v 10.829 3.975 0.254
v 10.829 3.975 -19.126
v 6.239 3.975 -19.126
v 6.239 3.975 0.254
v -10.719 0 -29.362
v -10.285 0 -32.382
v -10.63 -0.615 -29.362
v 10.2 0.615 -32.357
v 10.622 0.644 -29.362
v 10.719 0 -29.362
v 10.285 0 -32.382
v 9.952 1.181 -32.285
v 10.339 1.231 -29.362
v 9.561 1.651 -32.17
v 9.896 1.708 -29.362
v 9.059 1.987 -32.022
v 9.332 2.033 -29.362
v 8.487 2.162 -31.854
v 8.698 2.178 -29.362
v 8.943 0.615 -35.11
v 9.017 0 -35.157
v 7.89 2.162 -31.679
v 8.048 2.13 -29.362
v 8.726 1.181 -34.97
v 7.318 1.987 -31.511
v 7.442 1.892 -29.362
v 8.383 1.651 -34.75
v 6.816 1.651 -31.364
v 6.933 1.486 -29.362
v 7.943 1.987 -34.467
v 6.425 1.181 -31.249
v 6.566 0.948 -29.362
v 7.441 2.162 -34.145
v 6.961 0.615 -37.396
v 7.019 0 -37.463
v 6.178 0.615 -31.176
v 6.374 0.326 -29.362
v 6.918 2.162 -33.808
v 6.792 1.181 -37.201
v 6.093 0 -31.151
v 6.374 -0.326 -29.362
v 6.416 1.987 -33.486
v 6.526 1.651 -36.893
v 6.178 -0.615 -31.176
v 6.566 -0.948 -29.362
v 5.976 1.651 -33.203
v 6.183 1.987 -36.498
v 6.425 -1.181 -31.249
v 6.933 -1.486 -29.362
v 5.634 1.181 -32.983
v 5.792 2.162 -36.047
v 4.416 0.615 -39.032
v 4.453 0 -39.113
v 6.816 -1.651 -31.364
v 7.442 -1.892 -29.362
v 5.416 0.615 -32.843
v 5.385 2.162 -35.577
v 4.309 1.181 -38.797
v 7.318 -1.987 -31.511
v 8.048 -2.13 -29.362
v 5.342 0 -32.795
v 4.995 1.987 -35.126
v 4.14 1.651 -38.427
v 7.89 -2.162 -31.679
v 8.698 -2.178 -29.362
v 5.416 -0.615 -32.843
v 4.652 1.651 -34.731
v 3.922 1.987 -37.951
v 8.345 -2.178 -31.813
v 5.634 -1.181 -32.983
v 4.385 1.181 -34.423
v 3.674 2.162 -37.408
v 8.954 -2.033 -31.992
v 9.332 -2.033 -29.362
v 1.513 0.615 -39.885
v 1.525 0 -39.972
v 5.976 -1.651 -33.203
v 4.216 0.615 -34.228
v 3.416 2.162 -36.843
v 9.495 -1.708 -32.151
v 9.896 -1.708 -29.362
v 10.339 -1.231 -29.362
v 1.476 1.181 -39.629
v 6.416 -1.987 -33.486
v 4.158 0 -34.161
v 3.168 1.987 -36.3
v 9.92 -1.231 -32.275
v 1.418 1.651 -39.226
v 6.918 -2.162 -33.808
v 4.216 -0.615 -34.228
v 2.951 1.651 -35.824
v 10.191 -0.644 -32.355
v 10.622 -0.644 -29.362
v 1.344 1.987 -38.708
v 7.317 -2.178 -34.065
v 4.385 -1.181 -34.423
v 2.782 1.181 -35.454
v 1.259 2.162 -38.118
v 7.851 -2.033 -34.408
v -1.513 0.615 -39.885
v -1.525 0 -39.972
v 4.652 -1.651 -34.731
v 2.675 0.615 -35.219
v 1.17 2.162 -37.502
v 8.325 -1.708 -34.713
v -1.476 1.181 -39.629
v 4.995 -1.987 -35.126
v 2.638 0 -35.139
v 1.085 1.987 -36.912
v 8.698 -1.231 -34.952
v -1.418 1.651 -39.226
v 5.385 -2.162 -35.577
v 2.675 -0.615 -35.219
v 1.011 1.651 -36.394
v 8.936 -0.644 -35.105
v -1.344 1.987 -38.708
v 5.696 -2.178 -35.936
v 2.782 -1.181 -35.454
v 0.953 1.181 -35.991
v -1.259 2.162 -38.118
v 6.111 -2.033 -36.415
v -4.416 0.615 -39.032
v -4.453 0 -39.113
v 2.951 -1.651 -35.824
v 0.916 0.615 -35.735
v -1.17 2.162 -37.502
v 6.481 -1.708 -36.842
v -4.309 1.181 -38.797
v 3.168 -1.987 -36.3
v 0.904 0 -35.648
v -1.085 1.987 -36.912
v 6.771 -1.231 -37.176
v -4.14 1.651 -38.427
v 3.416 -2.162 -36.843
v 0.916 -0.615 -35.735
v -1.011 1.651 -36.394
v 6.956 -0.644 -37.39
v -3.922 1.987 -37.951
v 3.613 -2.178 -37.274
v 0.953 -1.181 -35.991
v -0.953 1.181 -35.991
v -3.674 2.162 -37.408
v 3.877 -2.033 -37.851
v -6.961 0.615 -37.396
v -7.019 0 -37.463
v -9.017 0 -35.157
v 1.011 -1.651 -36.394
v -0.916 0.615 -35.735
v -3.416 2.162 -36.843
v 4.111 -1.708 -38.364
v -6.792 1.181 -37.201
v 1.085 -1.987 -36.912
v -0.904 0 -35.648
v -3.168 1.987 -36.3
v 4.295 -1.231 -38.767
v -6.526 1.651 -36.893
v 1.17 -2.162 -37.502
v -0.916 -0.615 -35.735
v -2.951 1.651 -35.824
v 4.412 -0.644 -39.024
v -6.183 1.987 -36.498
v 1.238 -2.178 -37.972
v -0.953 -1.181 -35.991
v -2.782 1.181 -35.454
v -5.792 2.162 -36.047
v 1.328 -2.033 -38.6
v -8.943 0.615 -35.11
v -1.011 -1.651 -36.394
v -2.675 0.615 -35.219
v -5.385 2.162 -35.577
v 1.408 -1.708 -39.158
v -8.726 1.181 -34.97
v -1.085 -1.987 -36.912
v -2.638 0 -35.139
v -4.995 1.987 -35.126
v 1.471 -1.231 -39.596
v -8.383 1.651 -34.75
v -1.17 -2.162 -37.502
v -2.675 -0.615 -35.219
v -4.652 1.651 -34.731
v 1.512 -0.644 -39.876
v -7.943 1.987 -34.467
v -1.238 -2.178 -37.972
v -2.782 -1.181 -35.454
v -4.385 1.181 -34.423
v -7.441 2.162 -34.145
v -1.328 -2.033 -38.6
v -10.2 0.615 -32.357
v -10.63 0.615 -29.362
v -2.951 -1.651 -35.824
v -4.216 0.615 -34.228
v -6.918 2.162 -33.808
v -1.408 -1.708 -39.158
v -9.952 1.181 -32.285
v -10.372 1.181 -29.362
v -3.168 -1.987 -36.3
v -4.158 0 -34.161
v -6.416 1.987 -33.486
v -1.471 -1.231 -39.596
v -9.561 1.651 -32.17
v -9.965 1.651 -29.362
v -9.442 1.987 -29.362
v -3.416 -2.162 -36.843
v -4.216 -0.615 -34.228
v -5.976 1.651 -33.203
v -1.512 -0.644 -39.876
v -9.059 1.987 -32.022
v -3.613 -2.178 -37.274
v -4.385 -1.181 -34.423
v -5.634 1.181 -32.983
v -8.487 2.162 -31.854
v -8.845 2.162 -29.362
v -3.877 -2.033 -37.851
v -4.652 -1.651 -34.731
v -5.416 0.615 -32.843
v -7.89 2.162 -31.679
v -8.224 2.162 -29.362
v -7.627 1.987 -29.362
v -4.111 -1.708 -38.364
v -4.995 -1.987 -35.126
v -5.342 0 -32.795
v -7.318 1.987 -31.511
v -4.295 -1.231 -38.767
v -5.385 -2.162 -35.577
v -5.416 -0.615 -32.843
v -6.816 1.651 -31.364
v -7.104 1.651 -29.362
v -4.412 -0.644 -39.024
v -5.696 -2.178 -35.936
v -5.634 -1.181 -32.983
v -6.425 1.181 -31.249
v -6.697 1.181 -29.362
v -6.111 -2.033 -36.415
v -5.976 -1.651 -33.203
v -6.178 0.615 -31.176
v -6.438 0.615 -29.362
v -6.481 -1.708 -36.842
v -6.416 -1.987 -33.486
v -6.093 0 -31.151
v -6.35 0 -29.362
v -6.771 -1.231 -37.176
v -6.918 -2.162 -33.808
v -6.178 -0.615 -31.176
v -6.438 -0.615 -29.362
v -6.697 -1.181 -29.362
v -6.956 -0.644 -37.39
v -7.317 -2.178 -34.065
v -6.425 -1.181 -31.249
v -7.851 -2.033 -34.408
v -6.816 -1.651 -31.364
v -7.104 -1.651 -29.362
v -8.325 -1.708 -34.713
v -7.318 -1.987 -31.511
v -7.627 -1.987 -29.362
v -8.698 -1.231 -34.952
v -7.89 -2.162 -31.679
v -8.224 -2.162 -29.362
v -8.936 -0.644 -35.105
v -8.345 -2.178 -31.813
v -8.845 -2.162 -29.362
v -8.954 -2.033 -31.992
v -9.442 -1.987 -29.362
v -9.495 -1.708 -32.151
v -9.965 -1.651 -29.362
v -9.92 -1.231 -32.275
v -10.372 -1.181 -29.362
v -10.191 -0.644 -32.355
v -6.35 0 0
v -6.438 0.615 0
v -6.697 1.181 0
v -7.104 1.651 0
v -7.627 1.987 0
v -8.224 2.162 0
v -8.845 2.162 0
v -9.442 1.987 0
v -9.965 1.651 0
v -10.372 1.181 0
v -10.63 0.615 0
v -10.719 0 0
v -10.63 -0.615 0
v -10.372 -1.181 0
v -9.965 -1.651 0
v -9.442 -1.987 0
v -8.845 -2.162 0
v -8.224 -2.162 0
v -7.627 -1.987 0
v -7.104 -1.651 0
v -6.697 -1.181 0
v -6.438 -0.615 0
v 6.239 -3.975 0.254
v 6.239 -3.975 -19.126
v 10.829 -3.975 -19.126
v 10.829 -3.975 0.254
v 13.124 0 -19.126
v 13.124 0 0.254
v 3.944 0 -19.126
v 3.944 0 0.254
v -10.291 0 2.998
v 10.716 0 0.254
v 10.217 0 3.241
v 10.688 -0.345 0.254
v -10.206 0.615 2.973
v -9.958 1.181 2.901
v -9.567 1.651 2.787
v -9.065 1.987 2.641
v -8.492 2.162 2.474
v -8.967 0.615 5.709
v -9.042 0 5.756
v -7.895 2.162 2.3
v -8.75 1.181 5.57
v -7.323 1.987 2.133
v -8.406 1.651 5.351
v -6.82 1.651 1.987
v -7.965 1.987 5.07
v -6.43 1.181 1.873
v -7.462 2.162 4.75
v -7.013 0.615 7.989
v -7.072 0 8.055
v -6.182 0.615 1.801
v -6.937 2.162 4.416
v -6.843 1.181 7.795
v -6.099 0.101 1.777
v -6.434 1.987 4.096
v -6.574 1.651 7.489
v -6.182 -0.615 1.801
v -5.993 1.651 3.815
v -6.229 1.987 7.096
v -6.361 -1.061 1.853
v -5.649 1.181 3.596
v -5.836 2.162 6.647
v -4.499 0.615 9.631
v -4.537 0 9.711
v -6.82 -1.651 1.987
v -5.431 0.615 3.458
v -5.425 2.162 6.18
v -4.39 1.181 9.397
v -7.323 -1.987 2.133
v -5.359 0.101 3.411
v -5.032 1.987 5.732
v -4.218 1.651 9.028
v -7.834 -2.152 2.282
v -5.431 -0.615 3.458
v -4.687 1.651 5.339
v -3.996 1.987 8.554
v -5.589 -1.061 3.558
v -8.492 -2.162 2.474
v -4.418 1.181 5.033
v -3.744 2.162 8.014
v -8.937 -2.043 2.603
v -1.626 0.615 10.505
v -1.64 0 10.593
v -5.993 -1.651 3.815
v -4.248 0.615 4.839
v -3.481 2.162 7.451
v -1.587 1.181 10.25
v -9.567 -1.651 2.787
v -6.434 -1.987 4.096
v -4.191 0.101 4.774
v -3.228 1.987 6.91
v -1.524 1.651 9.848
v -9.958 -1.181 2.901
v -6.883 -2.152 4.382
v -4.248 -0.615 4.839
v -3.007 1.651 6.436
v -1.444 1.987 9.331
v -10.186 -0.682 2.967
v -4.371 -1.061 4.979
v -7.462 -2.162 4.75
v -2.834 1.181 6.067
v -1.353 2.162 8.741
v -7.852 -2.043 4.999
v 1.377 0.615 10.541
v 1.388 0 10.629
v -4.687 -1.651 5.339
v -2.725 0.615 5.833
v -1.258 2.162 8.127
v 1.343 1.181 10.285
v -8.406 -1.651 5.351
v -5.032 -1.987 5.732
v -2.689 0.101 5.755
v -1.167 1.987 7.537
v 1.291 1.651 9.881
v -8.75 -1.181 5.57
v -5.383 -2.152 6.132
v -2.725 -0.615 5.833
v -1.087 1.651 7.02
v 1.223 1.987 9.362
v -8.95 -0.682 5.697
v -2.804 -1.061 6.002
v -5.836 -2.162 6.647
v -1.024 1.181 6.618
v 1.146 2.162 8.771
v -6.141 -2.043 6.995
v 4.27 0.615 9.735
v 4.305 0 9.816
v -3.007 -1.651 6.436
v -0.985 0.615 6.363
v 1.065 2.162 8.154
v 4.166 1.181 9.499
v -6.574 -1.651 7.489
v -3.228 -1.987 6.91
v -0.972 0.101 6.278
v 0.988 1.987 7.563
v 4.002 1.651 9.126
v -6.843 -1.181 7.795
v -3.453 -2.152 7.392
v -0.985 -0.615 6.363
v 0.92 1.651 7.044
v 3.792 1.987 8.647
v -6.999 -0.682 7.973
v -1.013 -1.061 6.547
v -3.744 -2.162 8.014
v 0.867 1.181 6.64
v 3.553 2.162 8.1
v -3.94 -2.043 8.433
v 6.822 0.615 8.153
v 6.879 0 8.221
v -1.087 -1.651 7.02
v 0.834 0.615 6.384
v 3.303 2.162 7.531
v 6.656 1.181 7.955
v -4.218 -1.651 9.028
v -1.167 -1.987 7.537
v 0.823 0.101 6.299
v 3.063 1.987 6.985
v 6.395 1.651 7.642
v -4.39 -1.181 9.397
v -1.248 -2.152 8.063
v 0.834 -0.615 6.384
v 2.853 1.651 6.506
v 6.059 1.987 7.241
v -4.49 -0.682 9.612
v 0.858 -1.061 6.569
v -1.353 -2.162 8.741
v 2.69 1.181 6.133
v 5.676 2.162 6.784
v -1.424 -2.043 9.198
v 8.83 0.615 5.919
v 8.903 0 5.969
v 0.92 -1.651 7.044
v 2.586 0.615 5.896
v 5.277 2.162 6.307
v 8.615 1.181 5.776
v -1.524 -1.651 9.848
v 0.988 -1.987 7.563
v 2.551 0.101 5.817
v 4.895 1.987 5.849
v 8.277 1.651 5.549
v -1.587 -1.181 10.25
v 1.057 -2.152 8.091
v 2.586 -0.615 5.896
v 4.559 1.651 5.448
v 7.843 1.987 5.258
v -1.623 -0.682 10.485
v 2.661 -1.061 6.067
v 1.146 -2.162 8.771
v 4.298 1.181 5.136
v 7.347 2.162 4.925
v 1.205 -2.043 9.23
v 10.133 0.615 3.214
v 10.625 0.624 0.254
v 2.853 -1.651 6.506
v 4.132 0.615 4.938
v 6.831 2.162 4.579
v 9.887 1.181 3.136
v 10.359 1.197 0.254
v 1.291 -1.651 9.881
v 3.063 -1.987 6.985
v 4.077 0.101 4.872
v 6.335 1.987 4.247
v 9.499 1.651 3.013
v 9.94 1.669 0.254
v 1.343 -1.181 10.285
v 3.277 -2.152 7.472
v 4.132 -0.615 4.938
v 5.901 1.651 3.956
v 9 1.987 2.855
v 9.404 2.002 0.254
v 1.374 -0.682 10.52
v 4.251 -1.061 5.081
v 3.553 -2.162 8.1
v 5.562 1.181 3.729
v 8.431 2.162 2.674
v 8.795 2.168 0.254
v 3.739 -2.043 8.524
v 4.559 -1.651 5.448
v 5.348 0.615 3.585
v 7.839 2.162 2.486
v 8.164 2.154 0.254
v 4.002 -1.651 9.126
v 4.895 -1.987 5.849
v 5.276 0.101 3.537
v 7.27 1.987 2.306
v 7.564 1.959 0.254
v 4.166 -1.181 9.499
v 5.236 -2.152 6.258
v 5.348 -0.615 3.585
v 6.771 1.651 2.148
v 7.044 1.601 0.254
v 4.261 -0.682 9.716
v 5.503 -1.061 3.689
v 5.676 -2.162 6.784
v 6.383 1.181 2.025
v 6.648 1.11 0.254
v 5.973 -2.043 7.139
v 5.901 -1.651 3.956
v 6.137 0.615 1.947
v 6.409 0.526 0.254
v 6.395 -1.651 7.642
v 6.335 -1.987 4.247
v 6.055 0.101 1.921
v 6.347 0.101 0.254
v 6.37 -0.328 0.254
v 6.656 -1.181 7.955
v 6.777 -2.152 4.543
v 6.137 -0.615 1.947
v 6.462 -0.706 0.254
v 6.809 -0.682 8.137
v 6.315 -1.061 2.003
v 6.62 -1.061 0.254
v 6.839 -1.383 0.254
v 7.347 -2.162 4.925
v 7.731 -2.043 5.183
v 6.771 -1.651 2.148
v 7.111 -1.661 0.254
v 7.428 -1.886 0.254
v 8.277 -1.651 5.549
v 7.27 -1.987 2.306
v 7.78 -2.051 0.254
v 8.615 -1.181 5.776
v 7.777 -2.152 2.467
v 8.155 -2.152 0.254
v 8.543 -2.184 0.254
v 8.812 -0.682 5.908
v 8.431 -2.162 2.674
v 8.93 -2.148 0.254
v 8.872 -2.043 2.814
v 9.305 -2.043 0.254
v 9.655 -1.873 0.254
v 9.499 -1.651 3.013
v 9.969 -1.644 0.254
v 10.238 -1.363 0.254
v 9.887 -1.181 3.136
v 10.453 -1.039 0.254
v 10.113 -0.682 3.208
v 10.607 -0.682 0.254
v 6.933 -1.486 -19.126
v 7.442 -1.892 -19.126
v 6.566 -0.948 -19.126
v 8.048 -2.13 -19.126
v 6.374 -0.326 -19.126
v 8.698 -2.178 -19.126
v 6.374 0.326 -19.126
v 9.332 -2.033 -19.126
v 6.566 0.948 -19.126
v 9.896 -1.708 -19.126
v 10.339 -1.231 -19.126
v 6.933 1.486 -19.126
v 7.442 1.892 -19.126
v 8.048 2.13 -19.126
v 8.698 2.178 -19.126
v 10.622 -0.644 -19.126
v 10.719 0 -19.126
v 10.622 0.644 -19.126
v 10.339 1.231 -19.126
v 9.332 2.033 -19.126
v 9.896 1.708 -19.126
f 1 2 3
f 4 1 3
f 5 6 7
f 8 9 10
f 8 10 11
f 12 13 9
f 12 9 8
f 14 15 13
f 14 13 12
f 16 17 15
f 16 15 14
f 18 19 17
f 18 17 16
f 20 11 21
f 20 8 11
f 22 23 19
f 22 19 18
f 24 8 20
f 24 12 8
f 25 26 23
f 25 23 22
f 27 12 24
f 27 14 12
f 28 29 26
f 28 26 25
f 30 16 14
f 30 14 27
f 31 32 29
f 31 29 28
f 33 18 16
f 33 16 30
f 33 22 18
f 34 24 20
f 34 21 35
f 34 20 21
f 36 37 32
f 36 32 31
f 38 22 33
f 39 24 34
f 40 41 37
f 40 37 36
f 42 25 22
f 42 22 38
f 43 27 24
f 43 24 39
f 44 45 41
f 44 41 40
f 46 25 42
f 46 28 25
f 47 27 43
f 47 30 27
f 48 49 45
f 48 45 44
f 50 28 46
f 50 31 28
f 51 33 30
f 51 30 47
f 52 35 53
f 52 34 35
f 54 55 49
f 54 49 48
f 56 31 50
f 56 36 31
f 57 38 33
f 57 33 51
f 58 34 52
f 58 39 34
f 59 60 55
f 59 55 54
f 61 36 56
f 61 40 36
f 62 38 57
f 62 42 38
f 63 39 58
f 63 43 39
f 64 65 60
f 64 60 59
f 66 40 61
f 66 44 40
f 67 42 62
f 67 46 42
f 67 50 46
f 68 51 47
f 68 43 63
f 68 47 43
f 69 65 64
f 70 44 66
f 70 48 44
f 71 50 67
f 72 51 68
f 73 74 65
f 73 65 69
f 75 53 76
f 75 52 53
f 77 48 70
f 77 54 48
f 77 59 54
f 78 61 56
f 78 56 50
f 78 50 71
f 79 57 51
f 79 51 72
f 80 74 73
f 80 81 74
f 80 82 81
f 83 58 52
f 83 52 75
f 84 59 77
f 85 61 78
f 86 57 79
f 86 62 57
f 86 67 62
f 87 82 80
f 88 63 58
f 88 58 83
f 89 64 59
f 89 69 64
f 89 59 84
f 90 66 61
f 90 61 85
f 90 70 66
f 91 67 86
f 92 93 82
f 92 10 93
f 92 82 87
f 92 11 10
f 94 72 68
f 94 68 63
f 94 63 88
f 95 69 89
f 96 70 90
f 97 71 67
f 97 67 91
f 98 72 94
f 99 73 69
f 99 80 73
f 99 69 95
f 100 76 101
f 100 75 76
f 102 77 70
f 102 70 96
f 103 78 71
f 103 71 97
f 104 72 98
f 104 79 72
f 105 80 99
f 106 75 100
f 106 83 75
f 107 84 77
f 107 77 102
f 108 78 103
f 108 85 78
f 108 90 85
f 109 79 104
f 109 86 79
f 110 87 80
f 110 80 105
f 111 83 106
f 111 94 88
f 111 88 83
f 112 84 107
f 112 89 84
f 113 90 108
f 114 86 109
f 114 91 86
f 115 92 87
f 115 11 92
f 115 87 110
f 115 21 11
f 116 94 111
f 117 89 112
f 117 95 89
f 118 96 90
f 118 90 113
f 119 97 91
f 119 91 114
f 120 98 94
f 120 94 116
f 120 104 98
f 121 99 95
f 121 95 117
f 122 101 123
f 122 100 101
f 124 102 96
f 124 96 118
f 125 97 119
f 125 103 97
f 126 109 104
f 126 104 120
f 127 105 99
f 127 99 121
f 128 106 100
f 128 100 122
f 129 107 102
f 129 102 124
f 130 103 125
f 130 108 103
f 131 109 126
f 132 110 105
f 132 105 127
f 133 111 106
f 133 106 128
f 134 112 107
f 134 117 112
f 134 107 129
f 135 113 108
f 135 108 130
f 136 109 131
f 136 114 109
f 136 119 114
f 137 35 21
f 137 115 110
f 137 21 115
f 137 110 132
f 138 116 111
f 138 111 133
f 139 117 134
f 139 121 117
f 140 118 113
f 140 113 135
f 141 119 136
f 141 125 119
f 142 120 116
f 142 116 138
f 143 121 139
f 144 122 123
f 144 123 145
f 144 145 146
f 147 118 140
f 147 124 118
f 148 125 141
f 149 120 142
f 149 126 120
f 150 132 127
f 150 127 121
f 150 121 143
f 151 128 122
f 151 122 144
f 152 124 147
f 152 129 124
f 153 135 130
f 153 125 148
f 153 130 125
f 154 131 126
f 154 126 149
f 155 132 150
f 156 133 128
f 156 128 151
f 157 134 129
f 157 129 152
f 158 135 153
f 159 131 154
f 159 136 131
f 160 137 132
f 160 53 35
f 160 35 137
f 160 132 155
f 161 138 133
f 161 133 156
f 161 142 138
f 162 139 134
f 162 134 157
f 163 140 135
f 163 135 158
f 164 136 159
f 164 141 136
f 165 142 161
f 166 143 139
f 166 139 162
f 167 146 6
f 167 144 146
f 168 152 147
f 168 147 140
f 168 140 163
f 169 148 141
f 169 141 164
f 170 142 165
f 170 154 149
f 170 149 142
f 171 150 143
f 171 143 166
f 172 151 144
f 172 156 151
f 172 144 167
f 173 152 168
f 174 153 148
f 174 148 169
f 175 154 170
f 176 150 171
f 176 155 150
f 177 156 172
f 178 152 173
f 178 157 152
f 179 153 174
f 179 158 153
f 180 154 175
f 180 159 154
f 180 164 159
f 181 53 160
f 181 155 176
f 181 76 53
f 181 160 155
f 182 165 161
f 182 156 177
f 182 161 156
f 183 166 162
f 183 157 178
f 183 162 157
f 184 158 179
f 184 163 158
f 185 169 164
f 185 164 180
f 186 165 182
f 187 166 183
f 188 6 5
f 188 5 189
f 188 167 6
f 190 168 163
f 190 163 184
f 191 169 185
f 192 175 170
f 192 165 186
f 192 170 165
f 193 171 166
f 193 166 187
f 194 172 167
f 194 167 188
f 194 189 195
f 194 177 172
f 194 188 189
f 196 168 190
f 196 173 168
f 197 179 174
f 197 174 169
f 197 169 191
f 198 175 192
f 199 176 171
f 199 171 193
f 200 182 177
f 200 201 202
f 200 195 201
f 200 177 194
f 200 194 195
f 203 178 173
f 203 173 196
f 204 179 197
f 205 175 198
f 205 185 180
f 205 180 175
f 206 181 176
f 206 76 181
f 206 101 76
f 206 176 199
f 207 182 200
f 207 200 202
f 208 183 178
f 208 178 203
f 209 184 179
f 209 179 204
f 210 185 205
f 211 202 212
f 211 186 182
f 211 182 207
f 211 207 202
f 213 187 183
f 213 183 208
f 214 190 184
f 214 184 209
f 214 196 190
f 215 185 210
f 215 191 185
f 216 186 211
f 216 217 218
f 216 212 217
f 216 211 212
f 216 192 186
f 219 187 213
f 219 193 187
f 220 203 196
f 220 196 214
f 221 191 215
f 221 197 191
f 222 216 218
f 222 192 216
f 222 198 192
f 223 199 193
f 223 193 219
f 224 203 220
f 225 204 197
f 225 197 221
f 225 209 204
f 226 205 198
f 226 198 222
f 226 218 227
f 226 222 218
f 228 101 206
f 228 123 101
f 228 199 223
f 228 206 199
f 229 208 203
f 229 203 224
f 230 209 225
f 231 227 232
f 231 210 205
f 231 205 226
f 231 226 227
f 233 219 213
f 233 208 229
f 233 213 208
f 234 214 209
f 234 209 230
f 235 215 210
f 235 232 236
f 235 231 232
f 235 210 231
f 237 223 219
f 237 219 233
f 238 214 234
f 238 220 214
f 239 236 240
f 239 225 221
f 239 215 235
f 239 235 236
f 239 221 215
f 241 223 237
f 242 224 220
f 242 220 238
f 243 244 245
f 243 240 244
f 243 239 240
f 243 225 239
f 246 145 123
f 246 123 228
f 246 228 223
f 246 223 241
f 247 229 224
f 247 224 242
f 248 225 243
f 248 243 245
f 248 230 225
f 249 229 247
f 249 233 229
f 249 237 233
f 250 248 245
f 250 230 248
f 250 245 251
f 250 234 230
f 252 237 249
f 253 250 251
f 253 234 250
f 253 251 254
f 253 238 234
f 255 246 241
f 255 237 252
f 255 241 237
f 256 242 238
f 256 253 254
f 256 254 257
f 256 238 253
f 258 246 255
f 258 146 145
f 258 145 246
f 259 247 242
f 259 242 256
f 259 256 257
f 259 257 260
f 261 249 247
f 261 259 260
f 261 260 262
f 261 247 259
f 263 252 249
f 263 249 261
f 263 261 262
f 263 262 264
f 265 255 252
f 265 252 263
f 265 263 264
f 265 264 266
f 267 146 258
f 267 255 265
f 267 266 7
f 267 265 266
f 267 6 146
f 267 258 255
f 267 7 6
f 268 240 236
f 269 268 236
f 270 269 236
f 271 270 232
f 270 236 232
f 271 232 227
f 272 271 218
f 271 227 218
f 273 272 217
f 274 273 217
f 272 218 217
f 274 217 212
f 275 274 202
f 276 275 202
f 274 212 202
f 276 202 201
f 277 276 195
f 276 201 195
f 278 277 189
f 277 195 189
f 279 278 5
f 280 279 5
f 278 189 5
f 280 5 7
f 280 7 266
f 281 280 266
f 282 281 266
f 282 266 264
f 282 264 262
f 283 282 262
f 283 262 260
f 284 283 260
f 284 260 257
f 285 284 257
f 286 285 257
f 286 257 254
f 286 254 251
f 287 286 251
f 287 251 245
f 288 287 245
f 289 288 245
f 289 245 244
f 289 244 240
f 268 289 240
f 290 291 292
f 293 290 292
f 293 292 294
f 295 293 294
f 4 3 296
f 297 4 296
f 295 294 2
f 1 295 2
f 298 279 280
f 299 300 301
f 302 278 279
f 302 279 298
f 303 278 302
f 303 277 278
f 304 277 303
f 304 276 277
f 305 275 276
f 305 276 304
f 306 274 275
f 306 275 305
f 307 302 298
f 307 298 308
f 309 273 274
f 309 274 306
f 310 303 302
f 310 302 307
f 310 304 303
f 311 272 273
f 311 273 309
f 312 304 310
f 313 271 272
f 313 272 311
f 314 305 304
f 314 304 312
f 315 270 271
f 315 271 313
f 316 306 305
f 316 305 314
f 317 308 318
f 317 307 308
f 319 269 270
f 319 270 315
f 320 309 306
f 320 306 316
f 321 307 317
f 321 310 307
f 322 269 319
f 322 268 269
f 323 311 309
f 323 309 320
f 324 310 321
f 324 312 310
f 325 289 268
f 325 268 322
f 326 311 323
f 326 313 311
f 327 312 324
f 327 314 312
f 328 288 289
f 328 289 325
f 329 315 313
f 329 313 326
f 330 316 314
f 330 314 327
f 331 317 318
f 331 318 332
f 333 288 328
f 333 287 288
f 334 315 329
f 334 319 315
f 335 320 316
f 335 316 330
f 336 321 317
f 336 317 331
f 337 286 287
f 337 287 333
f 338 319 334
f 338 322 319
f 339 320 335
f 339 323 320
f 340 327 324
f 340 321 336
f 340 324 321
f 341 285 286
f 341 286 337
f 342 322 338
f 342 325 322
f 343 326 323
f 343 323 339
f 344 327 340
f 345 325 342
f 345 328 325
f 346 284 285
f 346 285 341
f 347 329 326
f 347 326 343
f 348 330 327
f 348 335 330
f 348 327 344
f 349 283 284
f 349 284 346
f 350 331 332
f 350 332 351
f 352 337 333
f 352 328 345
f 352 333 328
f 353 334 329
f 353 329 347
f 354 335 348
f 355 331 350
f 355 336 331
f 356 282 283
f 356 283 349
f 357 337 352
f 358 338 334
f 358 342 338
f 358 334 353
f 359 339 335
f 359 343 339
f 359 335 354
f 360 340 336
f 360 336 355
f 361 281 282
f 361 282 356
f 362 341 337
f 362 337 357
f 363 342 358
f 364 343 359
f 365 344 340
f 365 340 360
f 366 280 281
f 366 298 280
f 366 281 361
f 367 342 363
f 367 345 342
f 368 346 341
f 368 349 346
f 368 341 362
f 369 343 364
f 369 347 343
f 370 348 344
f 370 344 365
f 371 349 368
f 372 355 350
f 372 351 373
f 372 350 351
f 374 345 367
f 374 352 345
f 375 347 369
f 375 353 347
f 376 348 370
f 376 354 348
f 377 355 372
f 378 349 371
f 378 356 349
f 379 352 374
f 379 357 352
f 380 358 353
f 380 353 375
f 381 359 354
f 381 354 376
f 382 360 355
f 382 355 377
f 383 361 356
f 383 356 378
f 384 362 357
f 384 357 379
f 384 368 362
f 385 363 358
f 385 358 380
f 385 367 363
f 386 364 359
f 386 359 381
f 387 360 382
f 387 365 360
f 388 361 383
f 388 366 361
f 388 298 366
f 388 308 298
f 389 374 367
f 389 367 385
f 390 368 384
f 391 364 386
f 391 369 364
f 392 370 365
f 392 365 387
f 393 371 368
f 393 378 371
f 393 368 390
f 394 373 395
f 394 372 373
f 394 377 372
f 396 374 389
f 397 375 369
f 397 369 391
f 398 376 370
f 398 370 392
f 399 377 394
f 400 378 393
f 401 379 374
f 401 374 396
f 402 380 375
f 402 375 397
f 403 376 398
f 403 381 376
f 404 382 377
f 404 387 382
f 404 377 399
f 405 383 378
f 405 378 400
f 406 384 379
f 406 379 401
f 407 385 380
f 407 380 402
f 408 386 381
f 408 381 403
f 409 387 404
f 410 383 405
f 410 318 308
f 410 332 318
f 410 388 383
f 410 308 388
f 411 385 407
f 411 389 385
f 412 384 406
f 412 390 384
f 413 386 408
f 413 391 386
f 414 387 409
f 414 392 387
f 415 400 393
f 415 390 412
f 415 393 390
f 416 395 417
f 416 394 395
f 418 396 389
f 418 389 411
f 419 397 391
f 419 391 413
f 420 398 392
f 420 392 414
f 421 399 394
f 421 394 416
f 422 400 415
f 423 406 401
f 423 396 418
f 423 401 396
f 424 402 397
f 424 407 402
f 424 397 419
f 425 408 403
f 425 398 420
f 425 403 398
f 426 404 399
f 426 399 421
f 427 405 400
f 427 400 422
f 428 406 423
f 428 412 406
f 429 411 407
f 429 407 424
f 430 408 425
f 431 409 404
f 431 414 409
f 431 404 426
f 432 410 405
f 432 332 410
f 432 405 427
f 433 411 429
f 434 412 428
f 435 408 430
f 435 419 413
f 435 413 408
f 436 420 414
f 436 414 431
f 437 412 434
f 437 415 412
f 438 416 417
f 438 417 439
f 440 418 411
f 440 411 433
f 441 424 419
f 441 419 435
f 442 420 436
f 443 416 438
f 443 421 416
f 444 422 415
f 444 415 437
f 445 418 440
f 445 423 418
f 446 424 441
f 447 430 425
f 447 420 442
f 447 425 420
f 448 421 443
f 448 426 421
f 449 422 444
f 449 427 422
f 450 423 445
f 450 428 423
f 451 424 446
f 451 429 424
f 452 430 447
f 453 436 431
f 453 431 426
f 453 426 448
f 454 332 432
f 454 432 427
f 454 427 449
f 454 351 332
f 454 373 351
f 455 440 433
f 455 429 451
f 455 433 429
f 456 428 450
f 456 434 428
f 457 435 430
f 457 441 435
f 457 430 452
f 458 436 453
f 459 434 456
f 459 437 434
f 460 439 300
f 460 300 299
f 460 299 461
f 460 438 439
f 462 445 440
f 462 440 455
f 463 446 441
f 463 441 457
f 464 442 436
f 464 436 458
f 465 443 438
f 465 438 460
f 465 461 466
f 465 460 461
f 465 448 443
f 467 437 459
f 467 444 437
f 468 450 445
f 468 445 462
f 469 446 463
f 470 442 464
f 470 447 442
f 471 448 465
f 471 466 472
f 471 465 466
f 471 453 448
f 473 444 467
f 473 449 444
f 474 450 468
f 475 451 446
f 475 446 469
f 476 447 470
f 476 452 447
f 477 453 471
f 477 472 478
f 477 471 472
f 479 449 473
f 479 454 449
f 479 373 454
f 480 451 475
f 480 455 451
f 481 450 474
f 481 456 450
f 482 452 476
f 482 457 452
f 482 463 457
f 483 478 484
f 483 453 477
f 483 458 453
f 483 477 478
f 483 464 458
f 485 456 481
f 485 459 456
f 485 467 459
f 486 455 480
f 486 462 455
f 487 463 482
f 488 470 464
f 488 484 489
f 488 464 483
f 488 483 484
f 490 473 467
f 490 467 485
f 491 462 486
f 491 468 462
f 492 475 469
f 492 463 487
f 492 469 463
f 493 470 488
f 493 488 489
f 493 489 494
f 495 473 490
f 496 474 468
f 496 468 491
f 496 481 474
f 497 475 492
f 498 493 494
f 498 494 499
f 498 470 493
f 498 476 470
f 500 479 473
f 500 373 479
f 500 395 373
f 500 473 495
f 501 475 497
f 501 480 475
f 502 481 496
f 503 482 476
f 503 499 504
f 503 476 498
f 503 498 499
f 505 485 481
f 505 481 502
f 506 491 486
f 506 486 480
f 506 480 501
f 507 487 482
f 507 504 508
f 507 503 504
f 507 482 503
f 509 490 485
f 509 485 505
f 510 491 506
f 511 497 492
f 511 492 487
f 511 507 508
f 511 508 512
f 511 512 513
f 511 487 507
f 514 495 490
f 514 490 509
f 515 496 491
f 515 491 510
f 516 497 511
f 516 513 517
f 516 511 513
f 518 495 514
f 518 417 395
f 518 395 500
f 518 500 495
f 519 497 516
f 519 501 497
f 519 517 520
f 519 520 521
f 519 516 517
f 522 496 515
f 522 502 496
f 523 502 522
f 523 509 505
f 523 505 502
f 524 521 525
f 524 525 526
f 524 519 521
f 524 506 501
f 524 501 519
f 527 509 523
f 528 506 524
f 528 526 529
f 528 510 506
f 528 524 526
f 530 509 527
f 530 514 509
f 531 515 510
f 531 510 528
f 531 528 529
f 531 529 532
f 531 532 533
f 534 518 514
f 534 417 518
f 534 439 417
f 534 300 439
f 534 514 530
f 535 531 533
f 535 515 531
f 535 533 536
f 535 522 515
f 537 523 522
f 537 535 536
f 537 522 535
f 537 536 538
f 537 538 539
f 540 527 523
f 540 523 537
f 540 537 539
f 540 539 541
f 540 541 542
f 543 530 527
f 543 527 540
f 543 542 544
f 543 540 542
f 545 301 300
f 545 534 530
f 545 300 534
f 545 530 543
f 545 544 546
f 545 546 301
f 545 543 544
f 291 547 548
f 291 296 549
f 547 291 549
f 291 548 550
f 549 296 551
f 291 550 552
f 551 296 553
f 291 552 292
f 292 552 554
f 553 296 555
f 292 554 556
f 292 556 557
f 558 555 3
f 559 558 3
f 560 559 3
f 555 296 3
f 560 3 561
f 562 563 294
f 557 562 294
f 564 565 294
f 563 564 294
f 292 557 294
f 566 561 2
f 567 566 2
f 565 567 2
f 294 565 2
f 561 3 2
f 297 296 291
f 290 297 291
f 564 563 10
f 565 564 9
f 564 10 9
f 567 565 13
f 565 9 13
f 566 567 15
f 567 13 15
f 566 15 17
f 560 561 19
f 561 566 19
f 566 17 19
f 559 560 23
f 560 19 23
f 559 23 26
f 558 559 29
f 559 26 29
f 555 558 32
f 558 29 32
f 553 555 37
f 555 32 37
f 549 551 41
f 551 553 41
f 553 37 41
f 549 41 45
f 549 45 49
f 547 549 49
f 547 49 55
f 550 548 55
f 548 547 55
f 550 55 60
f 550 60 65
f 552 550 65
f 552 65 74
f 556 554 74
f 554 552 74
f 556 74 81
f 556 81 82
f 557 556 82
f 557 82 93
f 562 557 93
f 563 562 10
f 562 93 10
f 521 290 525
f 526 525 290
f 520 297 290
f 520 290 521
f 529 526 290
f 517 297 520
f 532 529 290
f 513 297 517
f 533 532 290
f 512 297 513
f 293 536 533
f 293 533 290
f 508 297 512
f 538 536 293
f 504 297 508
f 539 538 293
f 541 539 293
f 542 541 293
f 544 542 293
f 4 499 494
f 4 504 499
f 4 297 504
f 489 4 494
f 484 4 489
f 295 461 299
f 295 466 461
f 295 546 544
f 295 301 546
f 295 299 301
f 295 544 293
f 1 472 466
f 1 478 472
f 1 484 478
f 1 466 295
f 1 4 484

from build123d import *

# Parameters (mm, degrees)
SWEEP1_START             = -29.3624001
SWEEP1_OUTLINE_R         = 2.1844
SWEEP1_DEPTH             = 29.3624001
SWEEP1_2_OUTLINE_R       = 2.1844
SWEEP1_2_ANGLE           = 180
SWEEP1_3_OUTLINE_R       = 2.1844
SWEEP1_3_ANGLE           = 180
BOSS_EXTRUDE1_DEPTH      = 0.254
BOSS_EXTRUDE1_DEPTH_BACK = 19.1262


with BuildPart() as part:
    # Sweep1: read off the stored shape, not the designer's step
    # Sweep1 outline → Sweep1 (new body)
    with BuildSketch(Plane.XY.offset(SWEEP1_START)):
        with Locations((8.5344, 0)):
            Circle(SWEEP1_OUTLINE_R)
        with Locations((-8.5344, 0)):
            Circle(SWEEP1_OUTLINE_R)
    extrude(amount=SWEEP1_DEPTH)

    # Sweep1 2 outline → Sweep1 2 (revolve)
    with BuildSketch(Plane.XY.offset(-29.3624)):
        with Locations((8.5344, 0)):
            Circle(SWEEP1_2_OUTLINE_R)
    revolve(axis=Axis((0, 0, -29.3624), (0, 1, 0)), revolution_arc=SWEEP1_2_ANGLE)

    # Sweep1 3 outline → Sweep1 3 (revolve)
    with BuildSketch(Plane(origin=(0, 0, 0), x_dir=(-1, 0, 0), z_dir=(0, 0, -1))):
        with Locations((8.5344, 0)):
            Circle(SWEEP1_3_OUTLINE_R)
    revolve(axis=Axis((0, 0, 0), (0, 1, 0)), revolution_arc=SWEEP1_3_ANGLE)

    # Sketch2 → Boss-Extrude1 (add, two sides: drawn at the far end of the back side and taken through both)
    with BuildSketch(Plane.XY.offset(-BOSS_EXTRUDE1_DEPTH_BACK)):
        Polygon((13.12445011, 0), (10.829425055, 3.9751), (6.239374945, 3.9751), (3.94434989, 0), (6.239374945, -3.9751), (10.829425055, -3.9751), align=None)
    extrude(amount=BOSS_EXTRUDE1_DEPTH + BOSS_EXTRUDE1_DEPTH_BACK)


solid = part.part
